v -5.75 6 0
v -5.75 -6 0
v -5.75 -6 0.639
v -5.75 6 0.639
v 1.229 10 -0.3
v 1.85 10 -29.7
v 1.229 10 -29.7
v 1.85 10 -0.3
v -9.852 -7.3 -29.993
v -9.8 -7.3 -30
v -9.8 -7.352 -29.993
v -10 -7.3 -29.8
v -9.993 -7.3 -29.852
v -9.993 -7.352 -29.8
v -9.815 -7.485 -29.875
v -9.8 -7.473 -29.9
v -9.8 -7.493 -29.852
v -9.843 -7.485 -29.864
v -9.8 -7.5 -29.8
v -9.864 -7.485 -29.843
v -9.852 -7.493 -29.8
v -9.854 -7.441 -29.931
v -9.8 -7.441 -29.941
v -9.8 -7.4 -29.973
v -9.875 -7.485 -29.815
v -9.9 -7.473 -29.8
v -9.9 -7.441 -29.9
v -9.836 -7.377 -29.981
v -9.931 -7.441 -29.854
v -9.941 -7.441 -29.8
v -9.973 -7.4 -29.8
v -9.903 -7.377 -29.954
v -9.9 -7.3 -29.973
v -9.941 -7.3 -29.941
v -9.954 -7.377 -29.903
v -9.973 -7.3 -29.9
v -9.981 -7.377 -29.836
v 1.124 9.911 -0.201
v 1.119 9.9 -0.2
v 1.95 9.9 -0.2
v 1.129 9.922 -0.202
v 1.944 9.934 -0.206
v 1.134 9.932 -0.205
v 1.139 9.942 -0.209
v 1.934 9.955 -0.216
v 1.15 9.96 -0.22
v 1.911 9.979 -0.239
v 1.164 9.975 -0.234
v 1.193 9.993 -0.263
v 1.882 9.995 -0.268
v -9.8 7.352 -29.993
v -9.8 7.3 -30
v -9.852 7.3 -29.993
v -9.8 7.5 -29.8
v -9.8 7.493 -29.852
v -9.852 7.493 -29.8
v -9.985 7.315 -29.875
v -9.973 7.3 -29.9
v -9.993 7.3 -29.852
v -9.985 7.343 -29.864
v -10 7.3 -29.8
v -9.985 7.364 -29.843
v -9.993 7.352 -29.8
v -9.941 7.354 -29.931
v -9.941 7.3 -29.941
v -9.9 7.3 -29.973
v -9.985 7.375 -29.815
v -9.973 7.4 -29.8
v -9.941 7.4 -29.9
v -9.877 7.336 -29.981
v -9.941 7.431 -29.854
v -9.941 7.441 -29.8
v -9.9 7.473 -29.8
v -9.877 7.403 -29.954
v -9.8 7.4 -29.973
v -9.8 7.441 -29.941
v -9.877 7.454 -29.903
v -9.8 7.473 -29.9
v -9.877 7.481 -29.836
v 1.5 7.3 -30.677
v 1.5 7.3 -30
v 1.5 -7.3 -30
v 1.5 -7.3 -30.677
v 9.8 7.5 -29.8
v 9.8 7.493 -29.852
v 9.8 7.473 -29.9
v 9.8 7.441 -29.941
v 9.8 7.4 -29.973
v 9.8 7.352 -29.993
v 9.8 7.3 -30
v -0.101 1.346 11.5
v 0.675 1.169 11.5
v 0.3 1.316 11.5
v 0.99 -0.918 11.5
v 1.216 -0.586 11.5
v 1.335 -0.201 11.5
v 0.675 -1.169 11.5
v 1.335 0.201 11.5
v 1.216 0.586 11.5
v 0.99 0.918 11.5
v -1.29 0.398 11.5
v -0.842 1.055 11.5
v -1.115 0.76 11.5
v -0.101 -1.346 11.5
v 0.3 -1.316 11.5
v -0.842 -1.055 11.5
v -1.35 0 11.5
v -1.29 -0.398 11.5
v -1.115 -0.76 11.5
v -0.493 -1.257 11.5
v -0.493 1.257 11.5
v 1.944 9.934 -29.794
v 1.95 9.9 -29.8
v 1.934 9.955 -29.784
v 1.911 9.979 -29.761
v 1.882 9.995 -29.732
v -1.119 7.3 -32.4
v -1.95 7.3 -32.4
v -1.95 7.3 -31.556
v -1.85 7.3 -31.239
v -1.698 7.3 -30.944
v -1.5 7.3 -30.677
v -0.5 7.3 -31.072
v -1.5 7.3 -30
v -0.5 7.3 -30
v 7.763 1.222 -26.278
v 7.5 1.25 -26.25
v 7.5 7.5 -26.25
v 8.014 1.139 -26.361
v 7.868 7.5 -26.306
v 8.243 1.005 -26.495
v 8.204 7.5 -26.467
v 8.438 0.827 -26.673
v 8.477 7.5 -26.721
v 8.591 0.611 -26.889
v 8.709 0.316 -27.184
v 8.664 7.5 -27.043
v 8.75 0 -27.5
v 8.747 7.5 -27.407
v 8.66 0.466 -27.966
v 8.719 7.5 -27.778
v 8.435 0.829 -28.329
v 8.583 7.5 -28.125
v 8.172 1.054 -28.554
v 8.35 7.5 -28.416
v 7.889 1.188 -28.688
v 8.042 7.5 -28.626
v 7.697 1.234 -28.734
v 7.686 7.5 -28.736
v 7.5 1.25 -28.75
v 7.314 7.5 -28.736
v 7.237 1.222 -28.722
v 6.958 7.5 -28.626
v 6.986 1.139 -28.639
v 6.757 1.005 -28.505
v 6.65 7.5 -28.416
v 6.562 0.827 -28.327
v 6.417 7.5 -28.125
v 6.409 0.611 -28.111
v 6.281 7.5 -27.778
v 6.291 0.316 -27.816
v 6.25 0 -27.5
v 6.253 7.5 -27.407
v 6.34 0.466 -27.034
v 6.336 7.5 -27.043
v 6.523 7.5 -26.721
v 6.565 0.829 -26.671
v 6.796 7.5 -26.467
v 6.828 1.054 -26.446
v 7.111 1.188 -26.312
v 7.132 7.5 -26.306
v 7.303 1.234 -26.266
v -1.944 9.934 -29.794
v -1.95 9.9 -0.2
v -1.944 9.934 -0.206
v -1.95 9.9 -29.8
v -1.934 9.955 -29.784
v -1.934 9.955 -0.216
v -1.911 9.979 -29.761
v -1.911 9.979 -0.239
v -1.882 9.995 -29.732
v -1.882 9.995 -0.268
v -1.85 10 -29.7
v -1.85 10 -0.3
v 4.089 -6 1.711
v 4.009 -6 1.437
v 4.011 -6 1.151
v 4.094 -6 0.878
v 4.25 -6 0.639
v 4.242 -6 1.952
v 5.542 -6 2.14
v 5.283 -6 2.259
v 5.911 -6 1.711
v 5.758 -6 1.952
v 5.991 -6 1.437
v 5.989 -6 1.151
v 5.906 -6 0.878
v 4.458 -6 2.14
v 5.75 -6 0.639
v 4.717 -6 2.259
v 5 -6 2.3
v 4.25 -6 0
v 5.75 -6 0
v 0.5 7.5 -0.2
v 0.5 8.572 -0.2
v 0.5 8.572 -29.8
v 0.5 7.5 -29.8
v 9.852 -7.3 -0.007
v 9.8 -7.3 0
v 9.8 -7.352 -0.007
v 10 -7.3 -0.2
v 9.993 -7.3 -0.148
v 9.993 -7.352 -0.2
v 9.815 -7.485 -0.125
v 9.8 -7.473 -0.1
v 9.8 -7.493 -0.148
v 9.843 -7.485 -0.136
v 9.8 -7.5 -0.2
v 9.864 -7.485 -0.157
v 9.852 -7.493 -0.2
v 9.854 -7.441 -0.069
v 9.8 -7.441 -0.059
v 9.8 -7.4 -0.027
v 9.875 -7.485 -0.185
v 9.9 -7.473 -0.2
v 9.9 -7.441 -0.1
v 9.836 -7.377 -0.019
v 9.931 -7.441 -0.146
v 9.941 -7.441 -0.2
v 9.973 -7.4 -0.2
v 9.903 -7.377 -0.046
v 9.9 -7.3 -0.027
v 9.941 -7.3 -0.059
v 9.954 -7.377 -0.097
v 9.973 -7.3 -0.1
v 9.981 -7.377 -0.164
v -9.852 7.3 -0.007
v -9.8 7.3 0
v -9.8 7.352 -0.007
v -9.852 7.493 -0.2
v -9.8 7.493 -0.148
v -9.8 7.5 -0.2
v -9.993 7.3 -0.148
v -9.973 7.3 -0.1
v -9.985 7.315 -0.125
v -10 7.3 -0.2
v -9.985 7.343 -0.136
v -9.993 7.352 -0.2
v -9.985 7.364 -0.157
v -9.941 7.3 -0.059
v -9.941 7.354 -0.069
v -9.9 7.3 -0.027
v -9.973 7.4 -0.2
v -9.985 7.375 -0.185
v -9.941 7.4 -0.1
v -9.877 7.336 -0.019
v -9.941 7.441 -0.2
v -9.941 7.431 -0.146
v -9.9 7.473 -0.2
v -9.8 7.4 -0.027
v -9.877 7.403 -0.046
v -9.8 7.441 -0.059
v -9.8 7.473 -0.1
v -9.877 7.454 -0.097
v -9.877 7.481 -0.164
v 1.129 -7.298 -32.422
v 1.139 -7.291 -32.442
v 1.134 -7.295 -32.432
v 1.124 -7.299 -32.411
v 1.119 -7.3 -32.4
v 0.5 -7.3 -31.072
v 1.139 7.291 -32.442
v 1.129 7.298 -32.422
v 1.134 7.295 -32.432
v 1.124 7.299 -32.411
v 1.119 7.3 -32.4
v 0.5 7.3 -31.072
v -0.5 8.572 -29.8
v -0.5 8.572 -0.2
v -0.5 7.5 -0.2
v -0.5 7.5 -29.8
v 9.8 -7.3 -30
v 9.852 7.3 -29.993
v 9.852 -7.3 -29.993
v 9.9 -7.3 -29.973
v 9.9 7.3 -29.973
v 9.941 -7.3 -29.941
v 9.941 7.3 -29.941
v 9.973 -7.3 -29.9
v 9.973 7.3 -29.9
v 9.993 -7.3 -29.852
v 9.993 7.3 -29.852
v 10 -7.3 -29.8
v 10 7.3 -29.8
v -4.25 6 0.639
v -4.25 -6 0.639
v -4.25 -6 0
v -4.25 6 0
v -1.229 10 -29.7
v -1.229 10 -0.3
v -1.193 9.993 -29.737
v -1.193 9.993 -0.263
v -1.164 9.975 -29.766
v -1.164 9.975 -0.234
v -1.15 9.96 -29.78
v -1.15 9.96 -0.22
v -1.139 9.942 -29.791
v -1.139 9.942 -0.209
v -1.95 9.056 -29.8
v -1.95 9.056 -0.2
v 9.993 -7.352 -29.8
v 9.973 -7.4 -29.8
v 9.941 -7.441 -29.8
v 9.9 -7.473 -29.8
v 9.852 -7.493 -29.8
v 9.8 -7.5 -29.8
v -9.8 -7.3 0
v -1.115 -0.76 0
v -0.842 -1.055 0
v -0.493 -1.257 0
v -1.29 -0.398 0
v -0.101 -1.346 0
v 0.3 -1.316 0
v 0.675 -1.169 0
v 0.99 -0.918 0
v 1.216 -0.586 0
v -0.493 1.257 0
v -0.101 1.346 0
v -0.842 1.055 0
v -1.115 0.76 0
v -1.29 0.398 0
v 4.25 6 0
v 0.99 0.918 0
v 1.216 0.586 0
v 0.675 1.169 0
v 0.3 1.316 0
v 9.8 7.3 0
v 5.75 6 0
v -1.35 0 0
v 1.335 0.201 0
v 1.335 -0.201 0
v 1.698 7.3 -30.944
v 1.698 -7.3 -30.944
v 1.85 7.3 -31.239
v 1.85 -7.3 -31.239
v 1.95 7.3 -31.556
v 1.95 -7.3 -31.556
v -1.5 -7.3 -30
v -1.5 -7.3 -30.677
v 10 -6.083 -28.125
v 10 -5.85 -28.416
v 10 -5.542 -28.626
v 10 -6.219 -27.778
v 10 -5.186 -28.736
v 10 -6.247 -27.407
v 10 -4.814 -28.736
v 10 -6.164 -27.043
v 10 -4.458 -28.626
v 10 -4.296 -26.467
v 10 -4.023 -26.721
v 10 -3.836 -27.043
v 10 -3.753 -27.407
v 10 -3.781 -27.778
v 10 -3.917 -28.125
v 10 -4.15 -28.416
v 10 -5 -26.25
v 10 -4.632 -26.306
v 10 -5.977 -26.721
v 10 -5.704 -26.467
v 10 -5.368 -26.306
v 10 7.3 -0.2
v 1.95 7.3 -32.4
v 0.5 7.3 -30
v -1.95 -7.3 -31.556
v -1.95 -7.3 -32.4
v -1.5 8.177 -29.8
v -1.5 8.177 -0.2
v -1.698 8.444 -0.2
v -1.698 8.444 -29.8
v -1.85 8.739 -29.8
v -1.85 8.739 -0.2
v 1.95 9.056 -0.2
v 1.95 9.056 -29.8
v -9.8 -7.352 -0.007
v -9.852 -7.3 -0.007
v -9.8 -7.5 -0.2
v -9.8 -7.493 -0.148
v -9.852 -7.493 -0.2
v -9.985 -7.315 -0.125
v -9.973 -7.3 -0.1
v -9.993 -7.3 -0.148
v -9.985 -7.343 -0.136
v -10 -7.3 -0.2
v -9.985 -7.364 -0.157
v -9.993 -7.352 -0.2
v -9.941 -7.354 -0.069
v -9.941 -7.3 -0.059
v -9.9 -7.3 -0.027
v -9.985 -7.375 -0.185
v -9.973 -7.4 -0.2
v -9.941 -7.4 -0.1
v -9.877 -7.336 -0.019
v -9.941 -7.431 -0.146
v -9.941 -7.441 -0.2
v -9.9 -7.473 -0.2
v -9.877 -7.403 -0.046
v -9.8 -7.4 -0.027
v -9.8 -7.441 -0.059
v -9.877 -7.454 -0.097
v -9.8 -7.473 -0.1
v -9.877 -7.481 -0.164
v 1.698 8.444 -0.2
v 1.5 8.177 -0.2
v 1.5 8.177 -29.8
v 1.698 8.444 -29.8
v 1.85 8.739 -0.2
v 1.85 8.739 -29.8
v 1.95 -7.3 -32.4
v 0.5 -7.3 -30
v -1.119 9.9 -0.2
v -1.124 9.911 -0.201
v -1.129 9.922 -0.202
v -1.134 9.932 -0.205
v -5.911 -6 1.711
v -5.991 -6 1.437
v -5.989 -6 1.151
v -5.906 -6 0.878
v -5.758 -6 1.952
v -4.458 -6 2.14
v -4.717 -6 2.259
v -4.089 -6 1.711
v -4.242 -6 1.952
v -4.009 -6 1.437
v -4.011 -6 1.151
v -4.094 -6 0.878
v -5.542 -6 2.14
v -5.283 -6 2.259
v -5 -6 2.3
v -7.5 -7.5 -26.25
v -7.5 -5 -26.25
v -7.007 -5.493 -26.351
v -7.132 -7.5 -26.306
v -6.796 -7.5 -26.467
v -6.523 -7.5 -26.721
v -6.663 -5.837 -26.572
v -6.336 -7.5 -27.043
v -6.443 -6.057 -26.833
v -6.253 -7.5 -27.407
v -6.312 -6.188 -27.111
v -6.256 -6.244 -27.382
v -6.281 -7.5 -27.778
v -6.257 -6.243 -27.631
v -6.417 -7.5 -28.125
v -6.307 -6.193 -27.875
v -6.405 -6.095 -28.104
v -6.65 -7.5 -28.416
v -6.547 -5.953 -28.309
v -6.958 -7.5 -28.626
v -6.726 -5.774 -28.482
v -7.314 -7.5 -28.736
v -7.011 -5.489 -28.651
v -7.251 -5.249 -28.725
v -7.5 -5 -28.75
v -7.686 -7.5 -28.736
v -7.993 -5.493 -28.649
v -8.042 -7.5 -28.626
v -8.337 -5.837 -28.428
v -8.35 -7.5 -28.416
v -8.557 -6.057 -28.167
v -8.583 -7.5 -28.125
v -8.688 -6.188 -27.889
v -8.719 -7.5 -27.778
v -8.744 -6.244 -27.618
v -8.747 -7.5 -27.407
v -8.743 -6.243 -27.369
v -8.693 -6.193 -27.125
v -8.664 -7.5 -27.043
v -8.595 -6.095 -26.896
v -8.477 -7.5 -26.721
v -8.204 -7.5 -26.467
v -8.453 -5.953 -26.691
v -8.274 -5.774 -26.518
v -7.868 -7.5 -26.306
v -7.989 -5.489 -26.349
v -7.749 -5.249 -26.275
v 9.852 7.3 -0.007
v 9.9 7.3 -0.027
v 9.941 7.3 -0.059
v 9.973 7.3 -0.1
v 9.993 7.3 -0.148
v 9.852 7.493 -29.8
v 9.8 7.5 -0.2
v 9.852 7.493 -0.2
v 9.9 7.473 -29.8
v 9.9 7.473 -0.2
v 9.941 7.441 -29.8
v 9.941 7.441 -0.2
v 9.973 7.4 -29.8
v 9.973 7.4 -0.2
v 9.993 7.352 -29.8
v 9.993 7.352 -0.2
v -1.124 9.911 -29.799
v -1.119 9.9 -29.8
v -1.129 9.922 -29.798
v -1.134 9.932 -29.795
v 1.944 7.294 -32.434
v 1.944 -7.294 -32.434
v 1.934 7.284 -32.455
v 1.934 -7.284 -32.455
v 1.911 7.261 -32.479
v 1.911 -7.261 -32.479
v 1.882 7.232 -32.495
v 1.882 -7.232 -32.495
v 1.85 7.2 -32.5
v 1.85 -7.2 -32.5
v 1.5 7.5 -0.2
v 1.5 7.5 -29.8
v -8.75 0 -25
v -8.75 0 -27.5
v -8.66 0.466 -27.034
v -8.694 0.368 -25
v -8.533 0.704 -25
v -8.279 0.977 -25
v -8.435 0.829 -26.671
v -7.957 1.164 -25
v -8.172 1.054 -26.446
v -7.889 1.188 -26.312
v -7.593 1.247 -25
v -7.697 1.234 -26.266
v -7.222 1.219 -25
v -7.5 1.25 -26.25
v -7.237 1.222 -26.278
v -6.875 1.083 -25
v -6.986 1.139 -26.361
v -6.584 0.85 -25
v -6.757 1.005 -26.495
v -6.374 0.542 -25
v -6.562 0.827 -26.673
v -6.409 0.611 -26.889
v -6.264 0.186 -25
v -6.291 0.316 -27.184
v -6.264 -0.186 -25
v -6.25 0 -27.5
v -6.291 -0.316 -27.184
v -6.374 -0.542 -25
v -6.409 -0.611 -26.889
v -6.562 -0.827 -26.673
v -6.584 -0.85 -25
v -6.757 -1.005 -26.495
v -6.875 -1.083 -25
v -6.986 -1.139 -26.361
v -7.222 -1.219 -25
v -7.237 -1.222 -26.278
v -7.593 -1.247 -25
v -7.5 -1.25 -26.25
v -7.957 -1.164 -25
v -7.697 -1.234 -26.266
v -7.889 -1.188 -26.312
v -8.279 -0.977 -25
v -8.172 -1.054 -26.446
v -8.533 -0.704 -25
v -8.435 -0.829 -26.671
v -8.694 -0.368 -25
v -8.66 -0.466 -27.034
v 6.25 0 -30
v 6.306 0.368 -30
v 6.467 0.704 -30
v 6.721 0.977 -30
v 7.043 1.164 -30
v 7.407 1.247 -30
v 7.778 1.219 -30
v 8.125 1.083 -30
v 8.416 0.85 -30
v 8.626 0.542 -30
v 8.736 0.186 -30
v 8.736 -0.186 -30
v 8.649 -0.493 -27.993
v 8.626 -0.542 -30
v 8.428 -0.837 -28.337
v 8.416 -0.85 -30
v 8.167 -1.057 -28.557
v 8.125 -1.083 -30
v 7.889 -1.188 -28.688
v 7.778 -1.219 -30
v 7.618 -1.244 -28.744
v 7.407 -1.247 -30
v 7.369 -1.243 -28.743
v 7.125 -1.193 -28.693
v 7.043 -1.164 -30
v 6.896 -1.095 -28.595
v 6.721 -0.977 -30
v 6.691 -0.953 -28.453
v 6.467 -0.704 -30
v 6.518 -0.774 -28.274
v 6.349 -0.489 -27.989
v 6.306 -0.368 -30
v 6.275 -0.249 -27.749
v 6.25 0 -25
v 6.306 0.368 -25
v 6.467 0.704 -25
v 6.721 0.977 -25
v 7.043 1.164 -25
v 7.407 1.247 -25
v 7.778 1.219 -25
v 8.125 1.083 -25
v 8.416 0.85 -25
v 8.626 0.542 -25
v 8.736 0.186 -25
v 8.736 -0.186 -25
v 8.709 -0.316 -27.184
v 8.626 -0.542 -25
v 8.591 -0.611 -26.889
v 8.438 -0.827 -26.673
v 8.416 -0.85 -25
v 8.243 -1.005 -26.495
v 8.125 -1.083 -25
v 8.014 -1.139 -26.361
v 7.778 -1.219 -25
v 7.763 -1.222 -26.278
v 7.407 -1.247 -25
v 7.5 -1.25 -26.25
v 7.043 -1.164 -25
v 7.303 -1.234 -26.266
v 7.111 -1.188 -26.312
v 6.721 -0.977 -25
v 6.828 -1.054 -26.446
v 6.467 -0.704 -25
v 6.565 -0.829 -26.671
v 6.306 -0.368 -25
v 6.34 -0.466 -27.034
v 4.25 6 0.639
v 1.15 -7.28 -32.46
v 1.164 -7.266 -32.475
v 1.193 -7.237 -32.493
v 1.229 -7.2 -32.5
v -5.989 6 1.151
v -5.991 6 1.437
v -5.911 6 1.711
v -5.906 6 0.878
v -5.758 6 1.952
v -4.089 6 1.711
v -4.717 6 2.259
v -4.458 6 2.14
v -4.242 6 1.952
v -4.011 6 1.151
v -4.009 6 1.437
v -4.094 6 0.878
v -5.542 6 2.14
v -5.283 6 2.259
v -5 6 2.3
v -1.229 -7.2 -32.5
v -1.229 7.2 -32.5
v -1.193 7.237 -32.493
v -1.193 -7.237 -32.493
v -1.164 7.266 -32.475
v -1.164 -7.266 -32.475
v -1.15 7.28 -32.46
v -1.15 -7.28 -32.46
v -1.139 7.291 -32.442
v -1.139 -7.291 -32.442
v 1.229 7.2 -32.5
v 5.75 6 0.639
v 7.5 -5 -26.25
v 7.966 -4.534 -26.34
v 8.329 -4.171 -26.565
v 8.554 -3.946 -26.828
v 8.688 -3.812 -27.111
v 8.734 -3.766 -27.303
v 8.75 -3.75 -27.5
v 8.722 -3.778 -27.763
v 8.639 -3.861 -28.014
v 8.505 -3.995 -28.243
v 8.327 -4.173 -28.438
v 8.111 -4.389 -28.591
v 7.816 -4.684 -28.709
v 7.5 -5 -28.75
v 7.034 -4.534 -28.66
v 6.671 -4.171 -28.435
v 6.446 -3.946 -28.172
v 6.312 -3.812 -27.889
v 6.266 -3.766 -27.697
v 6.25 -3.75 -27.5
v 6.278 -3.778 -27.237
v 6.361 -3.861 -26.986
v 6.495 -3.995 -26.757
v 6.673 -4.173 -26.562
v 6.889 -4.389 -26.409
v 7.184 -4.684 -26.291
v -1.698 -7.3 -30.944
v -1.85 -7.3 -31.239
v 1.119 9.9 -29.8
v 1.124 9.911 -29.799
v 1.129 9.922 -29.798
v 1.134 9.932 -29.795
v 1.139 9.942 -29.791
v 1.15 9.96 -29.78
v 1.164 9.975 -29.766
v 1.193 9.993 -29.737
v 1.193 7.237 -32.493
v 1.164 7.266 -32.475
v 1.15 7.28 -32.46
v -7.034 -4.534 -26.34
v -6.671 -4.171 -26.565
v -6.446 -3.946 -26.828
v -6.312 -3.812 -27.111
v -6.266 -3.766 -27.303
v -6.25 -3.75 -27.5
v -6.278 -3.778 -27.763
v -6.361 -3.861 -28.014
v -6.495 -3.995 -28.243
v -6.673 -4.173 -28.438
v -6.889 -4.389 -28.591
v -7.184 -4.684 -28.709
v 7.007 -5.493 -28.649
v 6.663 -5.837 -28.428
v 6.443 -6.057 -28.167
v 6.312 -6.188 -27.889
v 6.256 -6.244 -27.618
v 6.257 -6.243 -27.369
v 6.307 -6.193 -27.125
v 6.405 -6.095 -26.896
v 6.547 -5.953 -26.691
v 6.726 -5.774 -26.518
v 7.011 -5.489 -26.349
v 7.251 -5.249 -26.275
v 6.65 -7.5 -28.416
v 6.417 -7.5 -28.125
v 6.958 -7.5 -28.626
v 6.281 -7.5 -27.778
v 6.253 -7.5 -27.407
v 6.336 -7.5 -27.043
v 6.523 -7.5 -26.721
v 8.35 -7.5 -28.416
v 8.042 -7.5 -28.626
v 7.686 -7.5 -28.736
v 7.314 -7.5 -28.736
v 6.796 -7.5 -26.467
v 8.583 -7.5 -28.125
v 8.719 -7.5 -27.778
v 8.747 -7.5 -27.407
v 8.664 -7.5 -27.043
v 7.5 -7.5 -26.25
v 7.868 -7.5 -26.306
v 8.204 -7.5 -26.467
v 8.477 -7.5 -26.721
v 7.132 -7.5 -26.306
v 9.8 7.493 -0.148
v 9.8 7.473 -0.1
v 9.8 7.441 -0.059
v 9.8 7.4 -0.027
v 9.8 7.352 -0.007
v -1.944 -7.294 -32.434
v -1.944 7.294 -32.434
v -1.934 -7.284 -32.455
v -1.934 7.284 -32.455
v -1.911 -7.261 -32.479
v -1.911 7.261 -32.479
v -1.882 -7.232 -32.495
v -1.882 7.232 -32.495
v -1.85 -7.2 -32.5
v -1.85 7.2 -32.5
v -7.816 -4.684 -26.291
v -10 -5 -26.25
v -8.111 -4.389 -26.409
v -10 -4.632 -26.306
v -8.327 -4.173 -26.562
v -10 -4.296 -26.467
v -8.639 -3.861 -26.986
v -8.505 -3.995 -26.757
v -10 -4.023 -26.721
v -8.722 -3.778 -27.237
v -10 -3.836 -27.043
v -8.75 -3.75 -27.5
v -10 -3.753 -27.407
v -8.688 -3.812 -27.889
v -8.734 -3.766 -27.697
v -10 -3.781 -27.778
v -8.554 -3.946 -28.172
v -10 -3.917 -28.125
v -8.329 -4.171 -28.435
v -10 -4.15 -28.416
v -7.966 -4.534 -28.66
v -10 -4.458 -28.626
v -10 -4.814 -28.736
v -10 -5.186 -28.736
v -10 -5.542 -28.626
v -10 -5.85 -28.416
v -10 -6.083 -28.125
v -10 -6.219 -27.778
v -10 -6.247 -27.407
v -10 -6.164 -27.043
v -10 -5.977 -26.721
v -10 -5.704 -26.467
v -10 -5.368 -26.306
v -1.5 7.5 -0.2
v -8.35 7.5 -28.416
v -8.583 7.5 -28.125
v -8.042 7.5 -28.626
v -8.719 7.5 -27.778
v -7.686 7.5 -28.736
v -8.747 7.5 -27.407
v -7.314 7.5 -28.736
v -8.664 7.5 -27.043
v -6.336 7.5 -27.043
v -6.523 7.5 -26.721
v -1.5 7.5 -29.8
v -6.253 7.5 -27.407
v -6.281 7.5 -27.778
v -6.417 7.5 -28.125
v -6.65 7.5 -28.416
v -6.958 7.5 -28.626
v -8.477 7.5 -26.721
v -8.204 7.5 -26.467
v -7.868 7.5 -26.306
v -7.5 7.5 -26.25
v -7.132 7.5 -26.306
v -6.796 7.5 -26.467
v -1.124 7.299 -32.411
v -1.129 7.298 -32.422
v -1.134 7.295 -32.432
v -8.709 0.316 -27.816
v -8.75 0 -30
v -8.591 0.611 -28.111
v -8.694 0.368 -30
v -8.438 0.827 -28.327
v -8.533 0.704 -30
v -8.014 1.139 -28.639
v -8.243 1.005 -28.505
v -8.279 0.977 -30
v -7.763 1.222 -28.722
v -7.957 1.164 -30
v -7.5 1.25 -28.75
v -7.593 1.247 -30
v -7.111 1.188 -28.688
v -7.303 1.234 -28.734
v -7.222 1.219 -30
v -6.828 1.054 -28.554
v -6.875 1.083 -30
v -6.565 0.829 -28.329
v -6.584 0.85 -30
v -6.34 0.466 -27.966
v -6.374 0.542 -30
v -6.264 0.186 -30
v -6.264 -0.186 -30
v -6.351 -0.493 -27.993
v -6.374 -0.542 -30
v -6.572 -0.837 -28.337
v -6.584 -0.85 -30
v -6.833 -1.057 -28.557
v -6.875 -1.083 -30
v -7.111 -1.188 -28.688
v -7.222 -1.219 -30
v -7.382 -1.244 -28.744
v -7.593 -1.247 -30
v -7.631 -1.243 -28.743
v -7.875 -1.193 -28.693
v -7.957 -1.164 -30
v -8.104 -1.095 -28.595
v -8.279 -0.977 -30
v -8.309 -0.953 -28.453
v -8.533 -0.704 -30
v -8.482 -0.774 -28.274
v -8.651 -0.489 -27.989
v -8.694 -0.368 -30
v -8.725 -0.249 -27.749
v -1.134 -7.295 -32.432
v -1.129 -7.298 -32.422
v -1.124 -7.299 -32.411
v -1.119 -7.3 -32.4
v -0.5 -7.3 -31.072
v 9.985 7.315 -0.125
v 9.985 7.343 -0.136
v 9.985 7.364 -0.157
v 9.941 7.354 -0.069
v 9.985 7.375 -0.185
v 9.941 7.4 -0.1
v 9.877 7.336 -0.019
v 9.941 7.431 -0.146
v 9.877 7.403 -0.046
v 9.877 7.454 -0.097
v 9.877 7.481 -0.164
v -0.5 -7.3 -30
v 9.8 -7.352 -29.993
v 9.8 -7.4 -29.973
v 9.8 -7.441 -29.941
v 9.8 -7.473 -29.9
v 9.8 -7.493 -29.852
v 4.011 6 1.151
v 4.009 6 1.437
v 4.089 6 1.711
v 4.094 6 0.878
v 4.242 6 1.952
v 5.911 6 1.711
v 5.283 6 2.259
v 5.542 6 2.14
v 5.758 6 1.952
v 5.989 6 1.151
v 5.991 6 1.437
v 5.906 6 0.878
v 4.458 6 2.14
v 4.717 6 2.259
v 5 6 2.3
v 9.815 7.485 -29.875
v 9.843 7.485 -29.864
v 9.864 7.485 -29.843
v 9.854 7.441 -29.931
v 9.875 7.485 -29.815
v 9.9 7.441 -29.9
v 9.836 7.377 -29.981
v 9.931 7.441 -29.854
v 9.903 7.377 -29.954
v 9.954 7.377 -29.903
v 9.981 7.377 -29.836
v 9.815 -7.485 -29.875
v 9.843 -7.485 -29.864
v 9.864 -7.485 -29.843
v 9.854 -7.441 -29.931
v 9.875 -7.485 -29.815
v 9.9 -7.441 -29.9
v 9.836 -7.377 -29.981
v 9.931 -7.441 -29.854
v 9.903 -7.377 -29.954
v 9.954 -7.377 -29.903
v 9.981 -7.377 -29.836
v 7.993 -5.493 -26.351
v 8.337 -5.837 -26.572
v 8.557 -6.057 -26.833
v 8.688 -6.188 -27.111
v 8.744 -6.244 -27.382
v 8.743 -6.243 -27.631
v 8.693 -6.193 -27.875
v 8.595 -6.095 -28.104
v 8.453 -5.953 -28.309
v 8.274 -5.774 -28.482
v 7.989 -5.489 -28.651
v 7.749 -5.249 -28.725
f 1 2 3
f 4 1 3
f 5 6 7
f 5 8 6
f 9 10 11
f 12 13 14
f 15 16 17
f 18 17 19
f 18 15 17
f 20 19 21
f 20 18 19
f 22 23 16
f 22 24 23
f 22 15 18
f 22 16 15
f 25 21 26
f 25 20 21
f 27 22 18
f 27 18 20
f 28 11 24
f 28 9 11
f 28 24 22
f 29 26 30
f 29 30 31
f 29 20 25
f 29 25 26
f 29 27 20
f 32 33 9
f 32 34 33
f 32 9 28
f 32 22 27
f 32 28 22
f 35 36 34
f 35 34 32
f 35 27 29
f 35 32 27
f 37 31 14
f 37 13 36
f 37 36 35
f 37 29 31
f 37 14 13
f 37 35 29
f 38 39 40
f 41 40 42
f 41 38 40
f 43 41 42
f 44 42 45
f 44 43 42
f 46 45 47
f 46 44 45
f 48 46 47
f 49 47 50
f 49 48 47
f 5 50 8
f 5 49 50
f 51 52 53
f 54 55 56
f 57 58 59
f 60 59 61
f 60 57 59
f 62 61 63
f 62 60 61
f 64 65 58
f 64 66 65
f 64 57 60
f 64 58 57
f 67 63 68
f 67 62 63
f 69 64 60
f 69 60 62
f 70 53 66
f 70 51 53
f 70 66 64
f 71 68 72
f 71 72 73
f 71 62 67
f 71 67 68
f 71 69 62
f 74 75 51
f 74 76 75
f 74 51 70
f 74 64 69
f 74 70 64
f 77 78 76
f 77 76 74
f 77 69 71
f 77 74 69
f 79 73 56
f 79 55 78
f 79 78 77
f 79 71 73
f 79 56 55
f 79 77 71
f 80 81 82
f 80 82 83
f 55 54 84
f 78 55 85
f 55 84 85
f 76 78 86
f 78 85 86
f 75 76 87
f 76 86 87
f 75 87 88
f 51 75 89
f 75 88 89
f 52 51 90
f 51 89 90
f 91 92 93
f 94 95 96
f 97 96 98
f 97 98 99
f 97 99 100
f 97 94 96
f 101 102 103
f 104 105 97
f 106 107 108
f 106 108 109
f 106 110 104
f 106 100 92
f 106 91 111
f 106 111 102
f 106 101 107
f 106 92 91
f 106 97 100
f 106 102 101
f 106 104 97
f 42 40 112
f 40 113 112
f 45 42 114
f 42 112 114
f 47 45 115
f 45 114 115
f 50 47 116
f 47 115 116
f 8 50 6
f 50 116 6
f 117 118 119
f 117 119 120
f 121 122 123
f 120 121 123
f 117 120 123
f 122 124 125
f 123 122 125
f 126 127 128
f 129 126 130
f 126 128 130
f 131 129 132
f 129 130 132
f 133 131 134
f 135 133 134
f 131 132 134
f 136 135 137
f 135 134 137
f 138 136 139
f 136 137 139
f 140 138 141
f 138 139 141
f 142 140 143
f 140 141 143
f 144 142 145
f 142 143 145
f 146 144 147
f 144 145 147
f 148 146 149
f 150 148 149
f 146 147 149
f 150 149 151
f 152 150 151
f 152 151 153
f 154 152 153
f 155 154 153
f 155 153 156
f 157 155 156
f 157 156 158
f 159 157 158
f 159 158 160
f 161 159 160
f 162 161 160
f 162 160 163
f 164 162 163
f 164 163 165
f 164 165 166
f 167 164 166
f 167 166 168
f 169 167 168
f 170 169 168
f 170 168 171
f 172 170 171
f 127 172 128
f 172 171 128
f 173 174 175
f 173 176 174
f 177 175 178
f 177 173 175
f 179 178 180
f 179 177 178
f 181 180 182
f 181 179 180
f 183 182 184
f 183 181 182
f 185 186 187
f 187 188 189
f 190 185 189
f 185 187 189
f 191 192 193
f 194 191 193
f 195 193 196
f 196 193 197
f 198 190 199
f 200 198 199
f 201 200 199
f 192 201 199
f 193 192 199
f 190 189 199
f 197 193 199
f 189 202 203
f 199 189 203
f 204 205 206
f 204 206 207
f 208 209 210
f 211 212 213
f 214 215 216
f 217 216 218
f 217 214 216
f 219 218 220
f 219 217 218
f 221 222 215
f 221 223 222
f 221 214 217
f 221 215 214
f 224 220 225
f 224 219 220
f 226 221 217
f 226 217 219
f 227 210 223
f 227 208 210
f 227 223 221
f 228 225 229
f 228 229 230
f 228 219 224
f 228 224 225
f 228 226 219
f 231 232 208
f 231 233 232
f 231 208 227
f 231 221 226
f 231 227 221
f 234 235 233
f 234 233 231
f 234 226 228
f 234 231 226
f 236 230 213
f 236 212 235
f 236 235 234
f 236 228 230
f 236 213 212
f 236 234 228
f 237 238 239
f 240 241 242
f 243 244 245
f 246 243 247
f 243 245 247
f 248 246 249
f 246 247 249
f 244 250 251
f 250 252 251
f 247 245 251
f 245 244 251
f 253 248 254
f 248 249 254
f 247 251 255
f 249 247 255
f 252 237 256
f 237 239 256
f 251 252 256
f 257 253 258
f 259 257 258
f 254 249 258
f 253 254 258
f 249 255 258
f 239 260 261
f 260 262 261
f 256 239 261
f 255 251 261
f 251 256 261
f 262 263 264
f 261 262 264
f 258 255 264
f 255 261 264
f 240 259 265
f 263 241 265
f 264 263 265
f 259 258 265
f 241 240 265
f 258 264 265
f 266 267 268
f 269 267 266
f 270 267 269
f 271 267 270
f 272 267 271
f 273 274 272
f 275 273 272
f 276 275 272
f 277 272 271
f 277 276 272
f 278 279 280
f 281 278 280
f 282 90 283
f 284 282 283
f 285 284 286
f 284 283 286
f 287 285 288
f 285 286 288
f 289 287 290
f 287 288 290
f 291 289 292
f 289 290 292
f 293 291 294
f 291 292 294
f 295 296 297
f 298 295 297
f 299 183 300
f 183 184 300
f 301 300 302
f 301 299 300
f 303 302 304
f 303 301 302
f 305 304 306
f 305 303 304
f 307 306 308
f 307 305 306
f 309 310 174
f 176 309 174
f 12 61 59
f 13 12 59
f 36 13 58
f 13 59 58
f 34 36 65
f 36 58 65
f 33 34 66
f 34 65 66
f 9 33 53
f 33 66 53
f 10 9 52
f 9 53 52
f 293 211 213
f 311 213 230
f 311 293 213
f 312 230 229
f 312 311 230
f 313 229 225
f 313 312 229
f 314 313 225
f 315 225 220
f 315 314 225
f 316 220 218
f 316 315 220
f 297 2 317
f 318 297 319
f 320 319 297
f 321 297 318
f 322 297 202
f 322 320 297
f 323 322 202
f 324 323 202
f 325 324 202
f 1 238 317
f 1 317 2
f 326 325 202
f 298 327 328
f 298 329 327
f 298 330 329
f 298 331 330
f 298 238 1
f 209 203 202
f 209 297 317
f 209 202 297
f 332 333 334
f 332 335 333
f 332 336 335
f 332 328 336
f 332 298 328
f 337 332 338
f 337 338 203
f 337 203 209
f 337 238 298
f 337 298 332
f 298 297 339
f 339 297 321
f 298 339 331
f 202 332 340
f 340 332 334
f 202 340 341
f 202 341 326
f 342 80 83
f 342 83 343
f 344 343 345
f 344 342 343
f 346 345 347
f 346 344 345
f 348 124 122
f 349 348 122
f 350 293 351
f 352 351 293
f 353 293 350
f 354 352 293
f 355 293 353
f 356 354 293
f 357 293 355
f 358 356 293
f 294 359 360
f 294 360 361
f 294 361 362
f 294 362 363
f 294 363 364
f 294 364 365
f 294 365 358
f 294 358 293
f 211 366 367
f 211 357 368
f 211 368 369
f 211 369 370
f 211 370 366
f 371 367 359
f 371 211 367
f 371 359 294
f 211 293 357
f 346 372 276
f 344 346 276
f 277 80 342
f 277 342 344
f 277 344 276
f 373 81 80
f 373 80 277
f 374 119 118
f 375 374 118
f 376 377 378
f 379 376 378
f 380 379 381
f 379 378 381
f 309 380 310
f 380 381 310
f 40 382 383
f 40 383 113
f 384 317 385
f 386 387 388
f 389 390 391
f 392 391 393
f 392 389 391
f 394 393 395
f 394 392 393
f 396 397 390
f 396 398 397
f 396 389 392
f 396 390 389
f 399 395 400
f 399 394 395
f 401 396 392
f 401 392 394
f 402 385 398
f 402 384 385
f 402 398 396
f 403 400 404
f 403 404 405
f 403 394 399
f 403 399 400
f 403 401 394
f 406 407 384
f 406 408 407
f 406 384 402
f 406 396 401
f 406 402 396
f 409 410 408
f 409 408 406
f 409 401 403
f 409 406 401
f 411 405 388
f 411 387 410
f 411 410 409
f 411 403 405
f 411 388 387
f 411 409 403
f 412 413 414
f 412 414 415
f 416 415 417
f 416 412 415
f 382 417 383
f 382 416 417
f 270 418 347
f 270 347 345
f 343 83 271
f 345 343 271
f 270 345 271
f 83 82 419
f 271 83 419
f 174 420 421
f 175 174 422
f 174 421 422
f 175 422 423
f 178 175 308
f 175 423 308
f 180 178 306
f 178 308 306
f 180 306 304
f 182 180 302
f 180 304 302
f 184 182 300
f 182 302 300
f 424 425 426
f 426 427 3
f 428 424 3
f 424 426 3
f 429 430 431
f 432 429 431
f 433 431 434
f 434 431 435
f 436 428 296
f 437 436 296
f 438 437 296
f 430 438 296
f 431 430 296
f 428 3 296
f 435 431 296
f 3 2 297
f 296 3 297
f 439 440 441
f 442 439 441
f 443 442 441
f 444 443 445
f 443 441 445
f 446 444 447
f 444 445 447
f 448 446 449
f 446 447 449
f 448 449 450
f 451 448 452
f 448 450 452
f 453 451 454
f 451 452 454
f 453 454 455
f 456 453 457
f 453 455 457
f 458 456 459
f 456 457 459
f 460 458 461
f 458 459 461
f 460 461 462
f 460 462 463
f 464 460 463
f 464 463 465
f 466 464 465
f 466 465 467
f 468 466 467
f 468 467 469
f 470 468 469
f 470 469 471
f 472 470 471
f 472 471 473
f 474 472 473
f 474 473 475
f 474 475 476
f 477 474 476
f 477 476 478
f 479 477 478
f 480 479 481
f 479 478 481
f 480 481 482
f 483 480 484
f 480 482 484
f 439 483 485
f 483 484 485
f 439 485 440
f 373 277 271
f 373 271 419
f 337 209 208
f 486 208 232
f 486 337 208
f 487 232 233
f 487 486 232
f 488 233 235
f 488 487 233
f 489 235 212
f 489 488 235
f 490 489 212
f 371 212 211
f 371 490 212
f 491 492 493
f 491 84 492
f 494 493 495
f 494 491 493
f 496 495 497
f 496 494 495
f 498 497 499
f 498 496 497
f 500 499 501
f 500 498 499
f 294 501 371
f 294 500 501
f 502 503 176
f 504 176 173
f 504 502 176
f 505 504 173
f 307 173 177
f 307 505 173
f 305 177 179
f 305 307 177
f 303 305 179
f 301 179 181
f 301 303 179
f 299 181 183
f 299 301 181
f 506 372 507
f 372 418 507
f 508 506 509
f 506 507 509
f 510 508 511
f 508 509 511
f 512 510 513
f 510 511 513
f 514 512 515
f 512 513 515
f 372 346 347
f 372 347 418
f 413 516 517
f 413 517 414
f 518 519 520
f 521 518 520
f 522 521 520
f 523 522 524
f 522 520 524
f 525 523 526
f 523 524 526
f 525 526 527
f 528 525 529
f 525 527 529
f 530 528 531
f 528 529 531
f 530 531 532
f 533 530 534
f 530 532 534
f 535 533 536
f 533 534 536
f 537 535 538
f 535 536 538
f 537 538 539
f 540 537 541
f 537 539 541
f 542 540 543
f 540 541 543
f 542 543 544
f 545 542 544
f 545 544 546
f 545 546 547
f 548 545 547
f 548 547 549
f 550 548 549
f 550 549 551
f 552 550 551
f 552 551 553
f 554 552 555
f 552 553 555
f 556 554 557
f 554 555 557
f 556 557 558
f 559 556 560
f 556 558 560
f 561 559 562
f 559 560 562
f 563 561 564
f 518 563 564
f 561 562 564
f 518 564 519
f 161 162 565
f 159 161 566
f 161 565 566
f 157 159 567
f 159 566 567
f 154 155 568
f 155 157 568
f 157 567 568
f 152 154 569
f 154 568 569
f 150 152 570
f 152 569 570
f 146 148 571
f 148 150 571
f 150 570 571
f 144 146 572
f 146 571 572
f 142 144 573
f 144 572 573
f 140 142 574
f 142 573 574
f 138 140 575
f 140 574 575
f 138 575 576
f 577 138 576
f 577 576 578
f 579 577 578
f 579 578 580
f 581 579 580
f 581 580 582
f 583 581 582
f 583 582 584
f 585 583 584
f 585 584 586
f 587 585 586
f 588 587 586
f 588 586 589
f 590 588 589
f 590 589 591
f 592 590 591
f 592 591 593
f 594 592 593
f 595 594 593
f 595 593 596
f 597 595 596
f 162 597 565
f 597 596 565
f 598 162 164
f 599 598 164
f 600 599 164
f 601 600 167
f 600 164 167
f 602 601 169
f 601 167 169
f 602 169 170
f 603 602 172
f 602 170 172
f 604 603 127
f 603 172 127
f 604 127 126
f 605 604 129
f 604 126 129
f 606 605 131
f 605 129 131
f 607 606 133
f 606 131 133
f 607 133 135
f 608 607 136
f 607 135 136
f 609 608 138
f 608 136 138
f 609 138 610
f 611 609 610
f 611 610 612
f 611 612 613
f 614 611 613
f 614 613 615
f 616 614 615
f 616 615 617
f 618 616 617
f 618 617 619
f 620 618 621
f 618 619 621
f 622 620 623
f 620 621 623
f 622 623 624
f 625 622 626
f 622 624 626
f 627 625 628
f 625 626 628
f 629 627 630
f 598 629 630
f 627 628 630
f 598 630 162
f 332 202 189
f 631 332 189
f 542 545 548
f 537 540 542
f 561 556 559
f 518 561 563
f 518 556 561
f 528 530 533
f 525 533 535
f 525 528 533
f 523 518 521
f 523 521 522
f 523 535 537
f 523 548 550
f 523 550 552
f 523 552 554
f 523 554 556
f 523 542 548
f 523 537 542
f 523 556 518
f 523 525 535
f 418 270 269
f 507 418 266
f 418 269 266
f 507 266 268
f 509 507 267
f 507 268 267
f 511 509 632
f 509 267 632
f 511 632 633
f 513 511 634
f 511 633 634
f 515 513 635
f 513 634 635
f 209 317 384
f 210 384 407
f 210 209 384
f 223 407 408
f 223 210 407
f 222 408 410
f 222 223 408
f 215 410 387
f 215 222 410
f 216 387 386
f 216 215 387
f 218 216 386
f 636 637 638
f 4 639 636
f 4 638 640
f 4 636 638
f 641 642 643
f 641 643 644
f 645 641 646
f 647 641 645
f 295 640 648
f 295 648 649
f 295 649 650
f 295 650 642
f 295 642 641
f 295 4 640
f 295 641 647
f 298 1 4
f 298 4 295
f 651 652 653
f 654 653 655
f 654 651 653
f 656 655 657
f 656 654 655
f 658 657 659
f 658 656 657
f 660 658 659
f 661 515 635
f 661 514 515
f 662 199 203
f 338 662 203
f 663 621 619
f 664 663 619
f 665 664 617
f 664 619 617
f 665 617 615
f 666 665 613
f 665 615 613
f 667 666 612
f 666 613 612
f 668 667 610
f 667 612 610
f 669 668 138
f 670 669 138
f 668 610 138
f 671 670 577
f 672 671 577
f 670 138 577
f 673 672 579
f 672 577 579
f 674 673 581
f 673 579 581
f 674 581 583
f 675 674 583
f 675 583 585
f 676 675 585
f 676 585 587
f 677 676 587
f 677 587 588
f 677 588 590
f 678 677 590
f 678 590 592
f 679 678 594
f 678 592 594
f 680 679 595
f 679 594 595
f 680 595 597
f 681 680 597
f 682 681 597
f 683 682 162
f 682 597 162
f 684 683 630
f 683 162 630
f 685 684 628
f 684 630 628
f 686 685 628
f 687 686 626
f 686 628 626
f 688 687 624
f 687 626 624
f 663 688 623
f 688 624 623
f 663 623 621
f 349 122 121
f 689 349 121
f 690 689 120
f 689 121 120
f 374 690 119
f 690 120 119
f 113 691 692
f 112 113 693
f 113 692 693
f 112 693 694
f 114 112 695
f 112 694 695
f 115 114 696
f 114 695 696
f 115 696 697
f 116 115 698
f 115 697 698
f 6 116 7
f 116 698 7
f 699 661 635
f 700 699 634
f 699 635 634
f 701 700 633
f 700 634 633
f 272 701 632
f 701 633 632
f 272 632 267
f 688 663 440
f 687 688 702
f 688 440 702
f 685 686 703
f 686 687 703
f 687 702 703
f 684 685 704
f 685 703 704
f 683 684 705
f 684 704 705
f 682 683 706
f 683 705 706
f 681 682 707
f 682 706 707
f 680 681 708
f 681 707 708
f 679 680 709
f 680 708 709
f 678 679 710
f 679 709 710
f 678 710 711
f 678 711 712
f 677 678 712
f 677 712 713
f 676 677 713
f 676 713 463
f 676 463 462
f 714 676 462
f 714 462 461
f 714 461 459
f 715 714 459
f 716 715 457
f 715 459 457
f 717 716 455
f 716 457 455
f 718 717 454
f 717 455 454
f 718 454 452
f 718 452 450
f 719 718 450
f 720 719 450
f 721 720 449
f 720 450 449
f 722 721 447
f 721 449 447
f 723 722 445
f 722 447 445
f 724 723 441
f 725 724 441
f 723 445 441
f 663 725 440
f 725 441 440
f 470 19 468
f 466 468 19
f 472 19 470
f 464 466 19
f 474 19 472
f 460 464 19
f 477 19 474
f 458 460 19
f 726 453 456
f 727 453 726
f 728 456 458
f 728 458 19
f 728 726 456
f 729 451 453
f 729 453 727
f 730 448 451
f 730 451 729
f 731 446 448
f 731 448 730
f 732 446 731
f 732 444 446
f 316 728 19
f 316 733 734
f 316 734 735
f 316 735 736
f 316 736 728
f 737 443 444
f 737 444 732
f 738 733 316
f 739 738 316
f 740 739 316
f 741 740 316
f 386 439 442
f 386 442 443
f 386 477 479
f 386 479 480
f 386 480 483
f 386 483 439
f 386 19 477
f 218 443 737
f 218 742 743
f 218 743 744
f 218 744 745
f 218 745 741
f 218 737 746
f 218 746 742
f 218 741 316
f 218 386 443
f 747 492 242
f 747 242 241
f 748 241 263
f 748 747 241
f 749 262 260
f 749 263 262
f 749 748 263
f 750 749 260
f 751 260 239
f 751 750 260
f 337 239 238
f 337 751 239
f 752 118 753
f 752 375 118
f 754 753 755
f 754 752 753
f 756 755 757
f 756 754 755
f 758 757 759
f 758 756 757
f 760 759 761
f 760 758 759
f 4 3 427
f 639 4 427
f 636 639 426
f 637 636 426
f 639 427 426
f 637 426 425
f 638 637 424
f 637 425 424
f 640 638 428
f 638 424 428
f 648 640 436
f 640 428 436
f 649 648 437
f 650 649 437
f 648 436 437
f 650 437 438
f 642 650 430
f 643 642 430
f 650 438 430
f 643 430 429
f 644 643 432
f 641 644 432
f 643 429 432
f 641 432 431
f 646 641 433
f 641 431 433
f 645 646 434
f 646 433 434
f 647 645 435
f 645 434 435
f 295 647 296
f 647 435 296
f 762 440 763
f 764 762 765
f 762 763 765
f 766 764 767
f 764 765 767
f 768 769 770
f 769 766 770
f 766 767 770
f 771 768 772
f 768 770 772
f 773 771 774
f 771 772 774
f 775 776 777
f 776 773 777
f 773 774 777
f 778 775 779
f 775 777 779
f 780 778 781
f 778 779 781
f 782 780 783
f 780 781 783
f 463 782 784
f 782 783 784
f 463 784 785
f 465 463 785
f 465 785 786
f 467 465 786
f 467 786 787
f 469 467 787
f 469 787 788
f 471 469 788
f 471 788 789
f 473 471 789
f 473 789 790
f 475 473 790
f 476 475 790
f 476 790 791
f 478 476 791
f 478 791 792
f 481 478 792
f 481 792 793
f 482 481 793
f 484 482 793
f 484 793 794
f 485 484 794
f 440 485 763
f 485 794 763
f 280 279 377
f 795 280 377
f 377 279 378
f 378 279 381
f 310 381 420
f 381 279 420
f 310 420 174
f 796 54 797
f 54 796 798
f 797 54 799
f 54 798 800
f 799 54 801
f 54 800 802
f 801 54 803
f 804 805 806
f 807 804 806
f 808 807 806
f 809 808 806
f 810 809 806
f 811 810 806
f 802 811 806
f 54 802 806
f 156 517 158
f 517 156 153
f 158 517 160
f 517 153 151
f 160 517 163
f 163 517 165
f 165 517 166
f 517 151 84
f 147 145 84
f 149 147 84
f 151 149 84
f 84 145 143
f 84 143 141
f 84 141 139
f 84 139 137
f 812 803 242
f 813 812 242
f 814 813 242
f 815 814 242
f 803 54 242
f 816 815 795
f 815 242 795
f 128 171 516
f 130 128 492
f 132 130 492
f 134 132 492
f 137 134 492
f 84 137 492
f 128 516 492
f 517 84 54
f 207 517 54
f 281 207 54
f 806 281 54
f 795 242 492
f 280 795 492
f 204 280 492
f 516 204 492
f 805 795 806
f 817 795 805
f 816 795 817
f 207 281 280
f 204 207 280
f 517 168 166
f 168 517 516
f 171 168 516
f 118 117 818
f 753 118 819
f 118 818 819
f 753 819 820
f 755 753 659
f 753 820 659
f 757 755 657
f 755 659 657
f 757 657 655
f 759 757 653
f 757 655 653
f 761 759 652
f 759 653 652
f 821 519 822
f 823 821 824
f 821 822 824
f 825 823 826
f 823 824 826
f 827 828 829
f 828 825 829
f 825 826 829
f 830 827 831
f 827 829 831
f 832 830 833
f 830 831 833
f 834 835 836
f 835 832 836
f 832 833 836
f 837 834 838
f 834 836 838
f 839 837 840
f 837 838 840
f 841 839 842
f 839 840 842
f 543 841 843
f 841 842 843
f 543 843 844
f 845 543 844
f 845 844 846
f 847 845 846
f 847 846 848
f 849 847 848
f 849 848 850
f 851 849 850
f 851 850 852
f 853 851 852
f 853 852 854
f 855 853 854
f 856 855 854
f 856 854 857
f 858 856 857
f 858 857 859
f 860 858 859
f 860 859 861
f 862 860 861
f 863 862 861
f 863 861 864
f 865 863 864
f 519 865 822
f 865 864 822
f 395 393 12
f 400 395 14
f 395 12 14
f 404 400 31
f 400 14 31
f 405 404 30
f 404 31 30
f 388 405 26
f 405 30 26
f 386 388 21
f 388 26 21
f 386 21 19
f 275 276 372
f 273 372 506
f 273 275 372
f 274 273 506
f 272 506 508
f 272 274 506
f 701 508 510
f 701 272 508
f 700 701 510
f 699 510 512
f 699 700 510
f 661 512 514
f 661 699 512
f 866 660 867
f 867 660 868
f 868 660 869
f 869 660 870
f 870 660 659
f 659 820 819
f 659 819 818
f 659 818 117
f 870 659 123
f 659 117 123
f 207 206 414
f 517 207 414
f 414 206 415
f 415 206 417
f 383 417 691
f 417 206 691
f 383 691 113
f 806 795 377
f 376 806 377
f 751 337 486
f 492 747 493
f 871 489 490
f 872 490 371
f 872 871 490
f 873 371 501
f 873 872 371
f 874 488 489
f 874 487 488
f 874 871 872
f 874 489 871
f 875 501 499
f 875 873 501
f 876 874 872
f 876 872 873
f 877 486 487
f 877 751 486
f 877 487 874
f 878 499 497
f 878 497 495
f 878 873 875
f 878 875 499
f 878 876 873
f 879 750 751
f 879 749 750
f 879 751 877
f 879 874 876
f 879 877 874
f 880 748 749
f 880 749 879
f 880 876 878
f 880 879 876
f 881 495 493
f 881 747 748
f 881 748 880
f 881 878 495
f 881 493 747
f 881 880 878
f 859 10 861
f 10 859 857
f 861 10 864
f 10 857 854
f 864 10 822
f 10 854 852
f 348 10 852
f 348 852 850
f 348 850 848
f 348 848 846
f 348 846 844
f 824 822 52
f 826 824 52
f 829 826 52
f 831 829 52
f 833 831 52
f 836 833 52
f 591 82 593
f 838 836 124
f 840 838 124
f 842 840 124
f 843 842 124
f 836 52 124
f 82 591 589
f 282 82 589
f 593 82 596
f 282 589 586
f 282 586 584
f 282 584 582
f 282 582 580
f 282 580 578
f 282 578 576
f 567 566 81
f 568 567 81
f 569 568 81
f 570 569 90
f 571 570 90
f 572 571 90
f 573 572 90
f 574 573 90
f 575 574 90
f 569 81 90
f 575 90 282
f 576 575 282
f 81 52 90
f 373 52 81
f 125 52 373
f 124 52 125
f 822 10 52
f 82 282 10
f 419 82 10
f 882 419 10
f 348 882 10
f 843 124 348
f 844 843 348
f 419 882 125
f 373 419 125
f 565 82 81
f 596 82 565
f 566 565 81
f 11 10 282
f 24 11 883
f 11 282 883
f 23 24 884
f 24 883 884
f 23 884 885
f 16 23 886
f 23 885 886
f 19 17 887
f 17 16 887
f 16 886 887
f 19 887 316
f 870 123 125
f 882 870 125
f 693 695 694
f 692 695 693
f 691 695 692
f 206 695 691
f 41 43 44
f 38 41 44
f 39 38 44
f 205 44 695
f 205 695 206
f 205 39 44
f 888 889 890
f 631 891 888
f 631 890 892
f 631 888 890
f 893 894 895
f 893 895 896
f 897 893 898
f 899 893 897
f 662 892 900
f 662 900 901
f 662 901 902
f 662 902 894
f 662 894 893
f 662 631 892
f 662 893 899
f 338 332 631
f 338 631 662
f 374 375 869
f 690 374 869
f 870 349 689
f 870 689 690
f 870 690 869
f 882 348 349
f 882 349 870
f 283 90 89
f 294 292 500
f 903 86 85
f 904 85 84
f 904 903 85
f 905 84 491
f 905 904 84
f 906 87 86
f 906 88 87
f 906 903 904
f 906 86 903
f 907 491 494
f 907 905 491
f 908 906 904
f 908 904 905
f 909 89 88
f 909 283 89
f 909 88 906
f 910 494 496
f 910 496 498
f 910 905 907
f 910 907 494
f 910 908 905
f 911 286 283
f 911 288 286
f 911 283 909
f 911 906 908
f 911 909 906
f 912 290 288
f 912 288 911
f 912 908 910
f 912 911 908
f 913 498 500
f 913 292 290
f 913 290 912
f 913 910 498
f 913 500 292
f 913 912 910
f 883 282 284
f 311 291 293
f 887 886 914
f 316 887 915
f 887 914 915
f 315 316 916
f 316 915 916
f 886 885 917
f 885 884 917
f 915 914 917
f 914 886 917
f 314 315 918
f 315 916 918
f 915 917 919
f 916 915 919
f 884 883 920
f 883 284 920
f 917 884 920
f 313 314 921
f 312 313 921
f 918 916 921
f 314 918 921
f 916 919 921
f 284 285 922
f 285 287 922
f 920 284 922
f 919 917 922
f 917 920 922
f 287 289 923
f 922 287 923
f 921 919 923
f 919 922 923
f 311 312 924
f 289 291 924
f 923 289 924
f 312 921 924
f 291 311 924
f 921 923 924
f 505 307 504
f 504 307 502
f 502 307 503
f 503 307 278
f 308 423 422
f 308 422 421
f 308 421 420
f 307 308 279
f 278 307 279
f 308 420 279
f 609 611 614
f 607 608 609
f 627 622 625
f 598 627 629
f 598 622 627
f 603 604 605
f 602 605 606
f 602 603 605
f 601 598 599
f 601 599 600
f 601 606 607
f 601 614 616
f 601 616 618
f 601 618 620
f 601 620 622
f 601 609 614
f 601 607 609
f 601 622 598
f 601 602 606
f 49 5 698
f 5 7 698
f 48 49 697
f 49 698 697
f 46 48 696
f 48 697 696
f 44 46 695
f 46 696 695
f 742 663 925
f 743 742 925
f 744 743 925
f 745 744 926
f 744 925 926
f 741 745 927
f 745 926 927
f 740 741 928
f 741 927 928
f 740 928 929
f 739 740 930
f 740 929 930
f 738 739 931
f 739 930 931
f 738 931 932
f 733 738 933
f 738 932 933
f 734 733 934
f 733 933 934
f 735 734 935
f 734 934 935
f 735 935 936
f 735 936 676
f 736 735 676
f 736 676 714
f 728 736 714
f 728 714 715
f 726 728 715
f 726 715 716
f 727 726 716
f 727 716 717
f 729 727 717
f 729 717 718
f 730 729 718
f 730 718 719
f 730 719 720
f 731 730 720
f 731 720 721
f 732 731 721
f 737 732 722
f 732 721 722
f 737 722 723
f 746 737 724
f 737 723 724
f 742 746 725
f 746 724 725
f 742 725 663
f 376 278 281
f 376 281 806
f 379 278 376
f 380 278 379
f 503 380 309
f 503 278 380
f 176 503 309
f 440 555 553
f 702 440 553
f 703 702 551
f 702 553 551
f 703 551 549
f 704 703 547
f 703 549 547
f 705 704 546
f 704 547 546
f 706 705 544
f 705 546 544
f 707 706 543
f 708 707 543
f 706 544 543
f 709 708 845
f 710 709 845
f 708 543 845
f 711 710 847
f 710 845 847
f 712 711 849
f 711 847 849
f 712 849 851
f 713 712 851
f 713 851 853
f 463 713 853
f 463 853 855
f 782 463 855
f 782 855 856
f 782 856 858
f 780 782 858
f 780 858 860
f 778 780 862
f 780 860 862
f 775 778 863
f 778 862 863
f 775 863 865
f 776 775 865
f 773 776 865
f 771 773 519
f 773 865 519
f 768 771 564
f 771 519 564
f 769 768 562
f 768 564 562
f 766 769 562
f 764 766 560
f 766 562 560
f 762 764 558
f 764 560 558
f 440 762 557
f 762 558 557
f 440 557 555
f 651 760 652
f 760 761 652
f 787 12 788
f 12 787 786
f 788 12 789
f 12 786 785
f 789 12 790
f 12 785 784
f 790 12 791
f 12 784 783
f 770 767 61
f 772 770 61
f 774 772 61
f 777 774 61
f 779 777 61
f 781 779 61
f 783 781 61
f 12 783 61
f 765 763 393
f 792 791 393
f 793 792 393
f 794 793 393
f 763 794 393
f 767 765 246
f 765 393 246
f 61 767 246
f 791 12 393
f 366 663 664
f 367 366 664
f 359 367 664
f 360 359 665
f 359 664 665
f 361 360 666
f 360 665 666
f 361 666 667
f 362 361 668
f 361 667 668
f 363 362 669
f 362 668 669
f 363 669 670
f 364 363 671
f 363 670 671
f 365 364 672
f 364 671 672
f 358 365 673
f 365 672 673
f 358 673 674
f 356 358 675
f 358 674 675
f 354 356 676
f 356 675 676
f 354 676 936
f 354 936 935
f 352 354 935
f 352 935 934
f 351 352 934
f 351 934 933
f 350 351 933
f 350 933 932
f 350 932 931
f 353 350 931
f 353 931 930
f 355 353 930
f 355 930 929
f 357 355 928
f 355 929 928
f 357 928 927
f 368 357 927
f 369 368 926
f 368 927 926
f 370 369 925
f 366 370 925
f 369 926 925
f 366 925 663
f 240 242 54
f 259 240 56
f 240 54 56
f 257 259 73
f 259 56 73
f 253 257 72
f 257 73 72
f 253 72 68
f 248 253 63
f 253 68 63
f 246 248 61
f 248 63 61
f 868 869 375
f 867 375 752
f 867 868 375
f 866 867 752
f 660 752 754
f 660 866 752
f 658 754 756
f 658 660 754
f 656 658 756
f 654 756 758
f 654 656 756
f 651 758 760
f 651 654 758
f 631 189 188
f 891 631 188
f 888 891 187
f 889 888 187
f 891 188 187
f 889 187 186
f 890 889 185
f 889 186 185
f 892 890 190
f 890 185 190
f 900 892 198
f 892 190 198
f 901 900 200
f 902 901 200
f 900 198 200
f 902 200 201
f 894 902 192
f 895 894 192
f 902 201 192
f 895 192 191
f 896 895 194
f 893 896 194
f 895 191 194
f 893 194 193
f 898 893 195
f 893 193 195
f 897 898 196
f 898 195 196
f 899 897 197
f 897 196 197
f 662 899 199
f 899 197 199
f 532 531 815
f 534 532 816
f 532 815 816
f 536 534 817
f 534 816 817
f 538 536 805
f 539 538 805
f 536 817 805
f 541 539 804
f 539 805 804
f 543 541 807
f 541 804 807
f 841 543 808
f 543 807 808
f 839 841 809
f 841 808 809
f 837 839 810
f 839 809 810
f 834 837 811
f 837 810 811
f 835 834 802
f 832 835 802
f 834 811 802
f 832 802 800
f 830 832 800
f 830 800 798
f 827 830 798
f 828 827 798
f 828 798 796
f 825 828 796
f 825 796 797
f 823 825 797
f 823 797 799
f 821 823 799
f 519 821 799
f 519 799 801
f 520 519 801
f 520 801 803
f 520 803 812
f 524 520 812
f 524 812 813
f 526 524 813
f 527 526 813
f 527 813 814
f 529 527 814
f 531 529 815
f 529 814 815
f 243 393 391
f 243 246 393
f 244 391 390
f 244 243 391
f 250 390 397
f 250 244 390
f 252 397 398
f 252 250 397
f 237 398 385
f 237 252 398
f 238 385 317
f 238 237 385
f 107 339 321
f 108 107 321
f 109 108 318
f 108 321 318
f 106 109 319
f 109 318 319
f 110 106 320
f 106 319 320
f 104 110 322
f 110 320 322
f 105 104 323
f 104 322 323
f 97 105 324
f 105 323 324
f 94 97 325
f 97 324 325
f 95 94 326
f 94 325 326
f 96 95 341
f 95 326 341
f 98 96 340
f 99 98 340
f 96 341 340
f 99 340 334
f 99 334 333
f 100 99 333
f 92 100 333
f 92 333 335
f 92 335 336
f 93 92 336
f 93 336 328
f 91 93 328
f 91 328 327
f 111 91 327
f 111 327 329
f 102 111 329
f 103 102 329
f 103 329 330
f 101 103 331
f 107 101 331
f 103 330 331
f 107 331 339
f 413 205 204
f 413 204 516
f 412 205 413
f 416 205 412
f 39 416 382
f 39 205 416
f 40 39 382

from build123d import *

# Parameters (mm, degrees)
SKETCH_1_W           = 20
SKETCH_1_H           = 15
EXTRUDE_1_DEPTH      = 30
EXTRUDE_2_DEPTH      = 6
EXTRUDE_2_DEPTH_BACK = 6
SKETCH_3_R           = 1.35
EXTRUDE_3_DEPTH      = 11.5
EXTRUDE_START        = -0.2
EXTRUDE_4_DEPTH      = 29.6
EXTRUDE_5_DEPTH      = 14.6
FILLET_1_R           = 0.1
FILLET_2_R           = 0.2
SKETCH_6_R           = 1.25
CUT_EXTRUDE_1_DEPTH  = 38.165171868
SKETCH_7_R           = 1.25
CUT_EXTRUDE_2_DEPTH  = 40.449334595
SKETCH_8_R           = 1.25
CUT_EXTRUDE_3_DEPTH  = 5


with BuildPart() as part:
    # 草图1 → 凸台-拉伸1 (new body)
    with BuildSketch(Plane.XY):
        Rectangle(SKETCH_1_W, SKETCH_1_H)
    extrude(amount=-EXTRUDE_1_DEPTH)

    # 草图2 → 凸台-拉伸2 (add, two sides: drawn at the far end of the back side and taken through both)
    with BuildSketch(Plane(origin=(0, 0, 0), x_dir=(1, 0, 0), z_dir=(0, 1, 0)).offset(-EXTRUDE_2_DEPTH_BACK)):
        with BuildLine():
            Line((-4.25, 0), (-5.75, 0))
            Line((-5.75, 0), (-5.75, -0.638562172))
            ThreePointArc((-5.75, -0.638562172), (-5, -2.3), (-4.25, -0.638562172))
            Line((-4.25, -0.638562172), (-4.25, 0))
        make_face()
        with BuildLine():
            Line((4.25, 0), (4.25, -0.638562172))
            ThreePointArc((4.25, -0.638562172), (5, -2.3), (5.75, -0.638562172))
            Line((5.75, -0.638562172), (5.75, 0))
            Line((5.75, 0), (4.25, 0))
        make_face()
    extrude(amount=EXTRUDE_2_DEPTH + EXTRUDE_2_DEPTH_BACK)

    # 草图3 → 凸台-拉伸3 (add)
    with BuildSketch(Plane.XY):
        with Locations(Location((0, 0, 0), (0, 0, 180))):
            Circle(SKETCH_3_R)
    extrude(amount=EXTRUDE_3_DEPTH)

    # 草图4 → 凸台-拉伸4 (add)
    with BuildSketch(Plane.XY.offset(EXTRUDE_START)):
        with BuildLine():
            Line((-1.5, 7.5), (-1.5, 8.177124344))
            ThreePointArc((-1.5, 8.177124344), (-1.780042303, 8.588161527), (-1.95, 9.055590279))
            Line((-1.95, 9.055590279), (-1.95, 10))
            Line((-1.95, 10), (-1.165769145, 10))
            Line((-1.165769145, 10), (-0.5, 8.57225346))
            Line((-0.5, 8.57225346), (-0.5, 7.5))
            Line((-0.5, 7.5), (-1.5, 7.5))
        make_face()
        with BuildLine():
            Line((1.5, 7.5), (1.5, 8.177124344))
            ThreePointArc((1.5, 8.177124344), (1.780042303, 8.588161527), (1.95, 9.055590279))
            Line((1.95, 9.055590279), (1.95, 10))
            Line((1.95, 10), (1.165769145, 10))
            Line((1.165769145, 10), (0.5, 8.57225346))
            Line((0.5, 8.57225346), (0.5, 7.5))
            Line((0.5, 7.5), (1.5, 7.5))
        make_face()
    extrude(amount=-EXTRUDE_4_DEPTH)

    # 草图5 → 凸台-拉伸5 (add)
    with BuildSketch(Plane(origin=(0, 7.5, 0), x_dir=(-1, 0, 0), z_dir=(0, 1, 0)).offset(EXTRUDE_START)):
        with BuildLine():
            Line((1.5, -30), (1.5, -30.677124344))
            ThreePointArc((1.5, -30.677124344), (1.780042303, -31.088161527), (1.95, -31.555590279))
            Line((1.95, -31.555590279), (1.95, -32.5))
            Line((1.95, -32.5), (1.165769145, -32.5))
            Line((1.165769145, -32.5), (0.5, -31.07225346))
            Line((0.5, -31.07225346), (0.5, -30))
            Line((0.5, -30), (1.5, -30))
        make_face()
        with BuildLine():
            Line((-1.5, -30), (-1.5, -30.677124344))
            ThreePointArc((-1.5, -30.677124344), (-1.780042303, -31.088161527), (-1.95, -31.555590279))
            Line((-1.95, -31.555590279), (-1.95, -32.5))
            Line((-1.95, -32.5), (-1.165769145, -32.5))
            Line((-1.165769145, -32.5), (-0.5, -31.07225346))
            Line((-0.5, -31.07225346), (-0.5, -30))
            Line((-0.5, -30), (-1.5, -30))
        make_face()
    extrude(amount=-EXTRUDE_5_DEPTH)

    # 圆角1
    fillet_1_edges = [part.edges().sort_by_distance(p)[0] for p in [
        (-1.557884573, -7.3, -32.5),
        (-1.95, 0, -32.5),
        (-1.165769145, 0, -32.5),
        (-1.557884573, 7.3, -32.5),
        (-1.557884573, 10, -29.8),
        (-1.95, 10, -15),
        (-1.165769145, 10, -15),
        (-1.557884573, 10, -0.2),
        (1.557884573, 10, -29.8),
        (1.165769145, 10, -15),
        (1.95, 10, -15),
        (1.557884573, 10, -0.2),
        (1.557884573, -7.3, -32.5),
        (1.165769145, 0, -32.5),
        (1.95, 0, -32.5),
        (1.557884573, 7.3, -32.5),
    ]]
    fillet(fillet_1_edges, radius=FILLET_1_R)

    # 圆角2
    fillet_2_edges = [part.edges().sort_by_distance(p)[0] for p in [
        (10, 0, -30),
        (0, 7.5, -30),
        (-10, 0, -30),
        (0, 7.5, 0),
        (10, 0, 0),
        (0, -7.5, 0),
        (-10, 0, 0),
        (0, -7.5, -30),
        (-10, 7.5, -15),
        (10, 7.5, -15),
        (10, -7.5, -15),
        (-10, -7.5, -15),
    ]]
    fillet(fillet_2_edges, radius=FILLET_2_R - 0.0001)  # a hair under: the kernel refuses the full size

    # 草图6 → 切除-拉伸1 (cut, through all)
    with BuildSketch(Plane(origin=(0, 7.5, 0), x_dir=(-1, 0, 0), z_dir=(0, 1, 0))):
        with Locations(Location((7.5, -27.5, 0), (0, 0, 90))):
            Circle(SKETCH_6_R)
        with Locations(Location((-7.5, -27.5, 0), (0, 0, 90))):
            Circle(SKETCH_6_R)
    extrude(amount=-CUT_EXTRUDE_1_DEPTH, mode=Mode.SUBTRACT)

    # 草图7 → 切除-拉伸2 (cut, through all)
    with BuildSketch(Plane.ZY.offset(10)):
        with Locations((-27.5, -5)):
            Circle(SKETCH_7_R)
    extrude(amount=-CUT_EXTRUDE_2_DEPTH, mode=Mode.SUBTRACT)

    # 草图8 → 切除-拉伸3 (cut)
    with BuildSketch(Plane(origin=(0, 0, -30), x_dir=(-1, 0, 0), z_dir=(0, 0, -1))):
        with Locations((-7.5, 0)):
            Circle(SKETCH_8_R)
        with Locations((7.5, 0)):
            Circle(SKETCH_8_R)
    extrude(amount=-CUT_EXTRUDE_3_DEPTH, mode=Mode.SUBTRACT)


solid = part.part
